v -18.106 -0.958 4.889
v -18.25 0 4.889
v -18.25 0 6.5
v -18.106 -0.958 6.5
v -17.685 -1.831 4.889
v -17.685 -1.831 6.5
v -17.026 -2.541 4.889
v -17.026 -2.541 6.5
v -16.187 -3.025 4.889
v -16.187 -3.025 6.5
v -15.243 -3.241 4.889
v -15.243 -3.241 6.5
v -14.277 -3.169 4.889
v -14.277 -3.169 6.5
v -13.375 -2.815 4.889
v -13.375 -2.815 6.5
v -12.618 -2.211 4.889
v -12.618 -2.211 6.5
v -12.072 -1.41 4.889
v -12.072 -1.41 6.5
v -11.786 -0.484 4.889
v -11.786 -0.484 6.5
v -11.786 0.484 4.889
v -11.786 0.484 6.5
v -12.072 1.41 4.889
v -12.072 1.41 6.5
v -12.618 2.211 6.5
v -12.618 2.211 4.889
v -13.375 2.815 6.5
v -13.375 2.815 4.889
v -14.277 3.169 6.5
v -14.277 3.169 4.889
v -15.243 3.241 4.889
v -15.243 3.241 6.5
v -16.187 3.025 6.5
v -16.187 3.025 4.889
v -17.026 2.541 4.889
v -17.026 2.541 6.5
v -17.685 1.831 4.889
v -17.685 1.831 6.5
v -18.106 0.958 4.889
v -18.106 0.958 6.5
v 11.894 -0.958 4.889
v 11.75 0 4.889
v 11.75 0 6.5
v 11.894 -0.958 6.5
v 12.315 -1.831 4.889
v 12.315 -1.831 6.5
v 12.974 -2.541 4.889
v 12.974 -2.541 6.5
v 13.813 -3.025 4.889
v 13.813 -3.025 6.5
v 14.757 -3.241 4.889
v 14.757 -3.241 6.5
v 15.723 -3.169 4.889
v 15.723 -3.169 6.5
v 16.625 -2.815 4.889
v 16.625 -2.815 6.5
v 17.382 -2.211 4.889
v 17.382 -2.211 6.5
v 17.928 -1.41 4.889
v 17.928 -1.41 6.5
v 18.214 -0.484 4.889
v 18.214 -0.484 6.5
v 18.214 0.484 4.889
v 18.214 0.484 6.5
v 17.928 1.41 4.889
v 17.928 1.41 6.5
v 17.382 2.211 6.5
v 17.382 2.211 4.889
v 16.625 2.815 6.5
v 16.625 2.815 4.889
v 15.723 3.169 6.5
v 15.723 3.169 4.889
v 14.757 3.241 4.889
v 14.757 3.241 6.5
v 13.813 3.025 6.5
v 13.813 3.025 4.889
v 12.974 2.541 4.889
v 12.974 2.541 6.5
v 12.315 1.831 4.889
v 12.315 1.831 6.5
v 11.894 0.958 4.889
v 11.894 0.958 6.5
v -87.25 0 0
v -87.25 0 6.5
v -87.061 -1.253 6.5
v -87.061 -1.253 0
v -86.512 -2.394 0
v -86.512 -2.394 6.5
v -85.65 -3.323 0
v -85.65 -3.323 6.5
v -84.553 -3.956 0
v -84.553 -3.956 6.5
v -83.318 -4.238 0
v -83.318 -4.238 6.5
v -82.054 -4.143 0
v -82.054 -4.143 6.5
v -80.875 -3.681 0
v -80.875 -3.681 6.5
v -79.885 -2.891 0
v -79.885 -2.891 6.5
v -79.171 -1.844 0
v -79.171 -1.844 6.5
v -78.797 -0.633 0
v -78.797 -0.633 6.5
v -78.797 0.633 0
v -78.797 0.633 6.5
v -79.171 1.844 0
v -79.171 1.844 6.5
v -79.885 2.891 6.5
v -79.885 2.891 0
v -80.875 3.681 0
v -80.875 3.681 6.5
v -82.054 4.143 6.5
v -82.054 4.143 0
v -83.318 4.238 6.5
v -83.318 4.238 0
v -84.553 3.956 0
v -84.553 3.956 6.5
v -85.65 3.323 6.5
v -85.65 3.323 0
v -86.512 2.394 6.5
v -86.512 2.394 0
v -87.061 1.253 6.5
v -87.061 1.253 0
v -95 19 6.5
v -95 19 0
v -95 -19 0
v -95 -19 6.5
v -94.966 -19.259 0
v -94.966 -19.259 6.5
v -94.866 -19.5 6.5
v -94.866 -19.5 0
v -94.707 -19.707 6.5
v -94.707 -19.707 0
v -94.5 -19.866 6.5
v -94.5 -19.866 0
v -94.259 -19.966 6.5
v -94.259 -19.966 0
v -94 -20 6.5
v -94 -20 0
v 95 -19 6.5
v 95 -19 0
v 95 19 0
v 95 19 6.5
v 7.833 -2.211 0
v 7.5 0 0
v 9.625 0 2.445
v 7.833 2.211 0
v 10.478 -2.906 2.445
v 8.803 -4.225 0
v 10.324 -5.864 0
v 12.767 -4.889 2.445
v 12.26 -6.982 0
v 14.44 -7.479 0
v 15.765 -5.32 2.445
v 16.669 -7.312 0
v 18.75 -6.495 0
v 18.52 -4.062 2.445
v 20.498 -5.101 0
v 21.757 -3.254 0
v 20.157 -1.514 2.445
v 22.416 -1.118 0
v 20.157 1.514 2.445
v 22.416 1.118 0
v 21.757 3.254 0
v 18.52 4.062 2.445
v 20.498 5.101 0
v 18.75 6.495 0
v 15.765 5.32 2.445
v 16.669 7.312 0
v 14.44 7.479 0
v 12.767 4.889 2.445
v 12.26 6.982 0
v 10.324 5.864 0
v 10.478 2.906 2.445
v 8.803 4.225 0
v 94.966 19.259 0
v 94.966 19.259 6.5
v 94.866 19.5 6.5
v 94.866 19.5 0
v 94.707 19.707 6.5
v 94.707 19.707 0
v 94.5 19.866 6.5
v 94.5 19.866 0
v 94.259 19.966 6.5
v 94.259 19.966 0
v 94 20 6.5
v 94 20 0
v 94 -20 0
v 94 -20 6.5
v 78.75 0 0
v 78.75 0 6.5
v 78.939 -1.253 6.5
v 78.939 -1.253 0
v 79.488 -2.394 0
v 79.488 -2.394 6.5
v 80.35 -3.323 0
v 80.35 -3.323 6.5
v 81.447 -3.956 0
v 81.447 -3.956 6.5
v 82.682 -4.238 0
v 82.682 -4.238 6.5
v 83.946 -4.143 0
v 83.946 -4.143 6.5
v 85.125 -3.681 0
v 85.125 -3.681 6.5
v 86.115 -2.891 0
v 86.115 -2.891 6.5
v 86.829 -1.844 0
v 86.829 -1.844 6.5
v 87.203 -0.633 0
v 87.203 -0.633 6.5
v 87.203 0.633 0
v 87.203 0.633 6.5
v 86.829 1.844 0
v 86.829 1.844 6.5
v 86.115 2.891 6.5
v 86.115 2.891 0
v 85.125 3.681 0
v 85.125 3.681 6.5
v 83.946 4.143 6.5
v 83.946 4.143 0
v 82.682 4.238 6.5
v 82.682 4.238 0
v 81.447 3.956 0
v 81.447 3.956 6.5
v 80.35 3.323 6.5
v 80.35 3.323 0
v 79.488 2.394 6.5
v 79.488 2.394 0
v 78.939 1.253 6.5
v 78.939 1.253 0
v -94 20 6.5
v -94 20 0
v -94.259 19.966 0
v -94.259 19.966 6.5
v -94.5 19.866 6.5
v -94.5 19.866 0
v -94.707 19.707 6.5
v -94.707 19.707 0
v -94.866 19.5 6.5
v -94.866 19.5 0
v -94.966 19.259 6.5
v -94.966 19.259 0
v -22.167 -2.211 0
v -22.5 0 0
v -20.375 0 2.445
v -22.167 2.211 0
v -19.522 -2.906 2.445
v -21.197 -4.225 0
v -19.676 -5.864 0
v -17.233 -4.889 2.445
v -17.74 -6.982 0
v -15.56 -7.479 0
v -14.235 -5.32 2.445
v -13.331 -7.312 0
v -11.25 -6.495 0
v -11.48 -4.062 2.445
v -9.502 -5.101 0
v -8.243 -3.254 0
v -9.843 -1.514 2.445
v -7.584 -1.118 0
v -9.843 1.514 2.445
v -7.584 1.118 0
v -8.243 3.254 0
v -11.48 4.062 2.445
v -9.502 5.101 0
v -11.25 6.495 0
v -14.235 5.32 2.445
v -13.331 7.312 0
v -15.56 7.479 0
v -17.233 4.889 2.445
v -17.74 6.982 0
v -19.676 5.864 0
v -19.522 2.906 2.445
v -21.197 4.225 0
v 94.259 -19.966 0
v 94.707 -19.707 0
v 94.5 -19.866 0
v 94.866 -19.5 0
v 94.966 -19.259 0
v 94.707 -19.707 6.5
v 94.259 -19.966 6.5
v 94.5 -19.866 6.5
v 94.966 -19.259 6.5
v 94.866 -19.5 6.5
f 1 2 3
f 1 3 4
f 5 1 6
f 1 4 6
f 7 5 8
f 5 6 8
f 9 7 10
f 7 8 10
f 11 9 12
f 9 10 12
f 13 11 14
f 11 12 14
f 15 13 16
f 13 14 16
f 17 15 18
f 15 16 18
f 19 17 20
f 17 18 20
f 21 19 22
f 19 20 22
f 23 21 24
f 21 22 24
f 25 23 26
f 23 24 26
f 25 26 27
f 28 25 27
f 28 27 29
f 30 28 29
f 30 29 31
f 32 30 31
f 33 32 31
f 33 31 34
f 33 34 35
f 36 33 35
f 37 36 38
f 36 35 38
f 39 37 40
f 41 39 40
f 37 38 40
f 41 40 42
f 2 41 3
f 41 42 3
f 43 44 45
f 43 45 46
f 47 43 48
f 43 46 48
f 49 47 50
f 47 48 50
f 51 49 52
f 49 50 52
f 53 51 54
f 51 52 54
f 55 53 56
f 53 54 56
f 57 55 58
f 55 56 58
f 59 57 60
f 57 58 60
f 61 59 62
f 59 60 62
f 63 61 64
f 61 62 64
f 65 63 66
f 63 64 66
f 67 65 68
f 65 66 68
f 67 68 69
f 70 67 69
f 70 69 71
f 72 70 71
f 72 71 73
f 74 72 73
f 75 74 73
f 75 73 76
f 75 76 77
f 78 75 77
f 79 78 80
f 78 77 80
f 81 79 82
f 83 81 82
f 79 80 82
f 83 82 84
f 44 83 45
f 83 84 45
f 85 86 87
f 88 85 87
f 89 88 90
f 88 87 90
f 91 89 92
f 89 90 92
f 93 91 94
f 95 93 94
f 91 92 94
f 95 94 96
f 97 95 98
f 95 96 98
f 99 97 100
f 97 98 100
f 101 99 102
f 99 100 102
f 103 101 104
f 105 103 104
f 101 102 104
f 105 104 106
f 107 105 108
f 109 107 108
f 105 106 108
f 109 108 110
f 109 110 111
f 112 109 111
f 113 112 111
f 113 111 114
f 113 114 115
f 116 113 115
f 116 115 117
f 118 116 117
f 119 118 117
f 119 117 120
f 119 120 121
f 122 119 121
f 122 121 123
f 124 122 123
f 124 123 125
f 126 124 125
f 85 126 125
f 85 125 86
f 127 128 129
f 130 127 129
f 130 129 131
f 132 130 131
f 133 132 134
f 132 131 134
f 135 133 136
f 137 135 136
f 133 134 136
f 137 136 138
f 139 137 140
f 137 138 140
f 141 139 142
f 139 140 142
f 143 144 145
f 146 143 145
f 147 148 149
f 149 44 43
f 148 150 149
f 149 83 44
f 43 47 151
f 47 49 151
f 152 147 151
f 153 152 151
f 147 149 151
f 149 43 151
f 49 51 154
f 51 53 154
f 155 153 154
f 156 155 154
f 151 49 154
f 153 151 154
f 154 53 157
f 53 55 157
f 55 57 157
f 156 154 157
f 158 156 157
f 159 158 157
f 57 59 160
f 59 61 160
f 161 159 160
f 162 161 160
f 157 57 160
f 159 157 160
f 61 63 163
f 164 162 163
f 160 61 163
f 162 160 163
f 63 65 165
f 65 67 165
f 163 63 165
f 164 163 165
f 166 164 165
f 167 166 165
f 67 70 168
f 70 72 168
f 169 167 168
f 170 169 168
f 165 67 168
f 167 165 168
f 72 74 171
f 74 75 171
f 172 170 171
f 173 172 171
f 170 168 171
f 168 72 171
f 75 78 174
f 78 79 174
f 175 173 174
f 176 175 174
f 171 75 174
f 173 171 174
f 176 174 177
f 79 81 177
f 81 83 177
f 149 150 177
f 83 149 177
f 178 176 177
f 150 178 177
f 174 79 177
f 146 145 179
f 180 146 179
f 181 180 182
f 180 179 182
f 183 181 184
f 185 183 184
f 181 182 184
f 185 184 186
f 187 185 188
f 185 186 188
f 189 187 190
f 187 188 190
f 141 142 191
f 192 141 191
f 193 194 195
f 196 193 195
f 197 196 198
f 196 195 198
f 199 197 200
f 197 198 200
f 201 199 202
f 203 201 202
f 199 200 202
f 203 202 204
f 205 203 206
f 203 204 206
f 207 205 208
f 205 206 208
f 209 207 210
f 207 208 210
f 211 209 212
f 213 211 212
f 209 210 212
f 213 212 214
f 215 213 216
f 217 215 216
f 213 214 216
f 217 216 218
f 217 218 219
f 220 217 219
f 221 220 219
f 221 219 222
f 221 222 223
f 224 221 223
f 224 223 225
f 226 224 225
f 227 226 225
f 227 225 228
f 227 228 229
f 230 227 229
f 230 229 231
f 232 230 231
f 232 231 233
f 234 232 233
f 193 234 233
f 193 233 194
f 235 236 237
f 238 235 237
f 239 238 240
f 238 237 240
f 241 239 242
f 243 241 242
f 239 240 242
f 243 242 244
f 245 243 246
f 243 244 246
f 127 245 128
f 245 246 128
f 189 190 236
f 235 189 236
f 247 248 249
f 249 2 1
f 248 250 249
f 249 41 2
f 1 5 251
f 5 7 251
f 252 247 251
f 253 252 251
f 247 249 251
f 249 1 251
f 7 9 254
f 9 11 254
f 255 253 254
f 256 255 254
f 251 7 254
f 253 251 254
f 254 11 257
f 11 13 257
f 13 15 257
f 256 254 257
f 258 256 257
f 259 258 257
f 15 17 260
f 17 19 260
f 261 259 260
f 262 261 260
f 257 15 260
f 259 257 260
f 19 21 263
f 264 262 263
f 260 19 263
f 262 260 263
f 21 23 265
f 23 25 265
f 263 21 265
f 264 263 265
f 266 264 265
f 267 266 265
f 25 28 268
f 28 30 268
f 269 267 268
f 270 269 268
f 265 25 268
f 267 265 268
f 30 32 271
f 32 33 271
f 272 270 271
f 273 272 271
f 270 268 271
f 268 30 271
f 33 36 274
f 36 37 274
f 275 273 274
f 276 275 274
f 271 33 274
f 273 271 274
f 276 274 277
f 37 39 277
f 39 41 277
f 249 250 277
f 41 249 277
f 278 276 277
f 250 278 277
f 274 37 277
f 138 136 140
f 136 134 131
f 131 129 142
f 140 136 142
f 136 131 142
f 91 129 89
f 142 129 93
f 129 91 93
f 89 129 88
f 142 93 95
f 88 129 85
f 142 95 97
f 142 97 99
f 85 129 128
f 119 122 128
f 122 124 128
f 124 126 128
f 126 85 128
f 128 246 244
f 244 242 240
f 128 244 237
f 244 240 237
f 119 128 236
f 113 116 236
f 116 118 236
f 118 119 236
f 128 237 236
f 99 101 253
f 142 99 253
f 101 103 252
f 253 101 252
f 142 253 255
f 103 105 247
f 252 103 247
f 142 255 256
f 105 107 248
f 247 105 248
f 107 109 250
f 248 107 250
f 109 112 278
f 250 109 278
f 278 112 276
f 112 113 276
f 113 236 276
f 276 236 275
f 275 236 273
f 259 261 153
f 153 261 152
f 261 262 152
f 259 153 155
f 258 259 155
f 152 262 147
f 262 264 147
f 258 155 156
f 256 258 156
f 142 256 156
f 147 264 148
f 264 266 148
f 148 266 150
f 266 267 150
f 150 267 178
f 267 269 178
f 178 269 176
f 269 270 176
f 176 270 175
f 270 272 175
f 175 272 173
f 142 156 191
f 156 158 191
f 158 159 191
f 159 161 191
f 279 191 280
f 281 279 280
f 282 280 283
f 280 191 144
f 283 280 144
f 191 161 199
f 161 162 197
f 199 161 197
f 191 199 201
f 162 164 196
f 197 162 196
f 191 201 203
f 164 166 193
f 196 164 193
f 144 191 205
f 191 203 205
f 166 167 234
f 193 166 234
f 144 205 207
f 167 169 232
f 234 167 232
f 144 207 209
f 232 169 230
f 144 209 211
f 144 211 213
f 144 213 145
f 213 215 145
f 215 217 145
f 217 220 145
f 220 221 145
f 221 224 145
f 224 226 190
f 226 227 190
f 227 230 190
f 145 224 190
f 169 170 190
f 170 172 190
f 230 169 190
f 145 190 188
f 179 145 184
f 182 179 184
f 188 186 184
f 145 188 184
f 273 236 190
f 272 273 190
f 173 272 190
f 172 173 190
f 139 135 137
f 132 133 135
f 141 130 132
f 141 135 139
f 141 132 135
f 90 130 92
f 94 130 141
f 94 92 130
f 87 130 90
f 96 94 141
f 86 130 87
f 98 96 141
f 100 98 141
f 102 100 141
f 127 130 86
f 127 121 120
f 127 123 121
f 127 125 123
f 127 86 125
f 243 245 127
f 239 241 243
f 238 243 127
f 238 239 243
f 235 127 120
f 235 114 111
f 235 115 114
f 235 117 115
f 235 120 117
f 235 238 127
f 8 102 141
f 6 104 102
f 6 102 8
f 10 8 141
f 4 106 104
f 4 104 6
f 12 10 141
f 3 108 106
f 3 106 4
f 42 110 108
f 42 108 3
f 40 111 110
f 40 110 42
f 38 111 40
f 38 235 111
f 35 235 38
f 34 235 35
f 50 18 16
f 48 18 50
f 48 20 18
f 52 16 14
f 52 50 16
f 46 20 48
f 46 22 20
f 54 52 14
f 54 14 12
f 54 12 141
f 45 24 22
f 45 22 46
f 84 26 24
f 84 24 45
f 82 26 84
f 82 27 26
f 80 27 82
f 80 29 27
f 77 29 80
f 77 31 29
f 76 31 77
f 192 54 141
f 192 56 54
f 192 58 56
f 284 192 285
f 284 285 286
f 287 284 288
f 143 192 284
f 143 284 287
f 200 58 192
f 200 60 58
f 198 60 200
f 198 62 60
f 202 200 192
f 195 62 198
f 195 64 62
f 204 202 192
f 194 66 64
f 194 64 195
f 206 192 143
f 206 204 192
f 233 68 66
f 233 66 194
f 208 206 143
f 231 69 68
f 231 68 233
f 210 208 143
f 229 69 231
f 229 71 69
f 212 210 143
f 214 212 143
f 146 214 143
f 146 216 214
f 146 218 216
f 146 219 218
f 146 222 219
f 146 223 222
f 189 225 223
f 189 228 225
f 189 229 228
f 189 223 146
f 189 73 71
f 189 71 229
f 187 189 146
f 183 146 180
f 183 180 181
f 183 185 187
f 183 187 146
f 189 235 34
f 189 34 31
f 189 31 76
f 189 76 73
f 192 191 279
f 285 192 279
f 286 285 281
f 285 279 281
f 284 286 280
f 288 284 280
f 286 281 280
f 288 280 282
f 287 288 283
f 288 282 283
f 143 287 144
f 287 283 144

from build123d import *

# Parameters (mm, degrees)
F1_DEPTH       = 6.5
F2_D           = 8.5
F3_D           = 8.5
F4_D           = 6.5
F4_CSINK_D     = 15
F4_CSINK_ANGLE = 82
F5_D           = 6.5
F5_CSINK_D     = 15
F5_CSINK_ANGLE = 82


with BuildPart() as f1:
    # F0 (on Top) → F1 (new body)
    with BuildSketch(Plane.XY):
        with BuildLine():
            Line((94, 20), (-94, 20))
            ThreePointArc((-94, 20), (-94.707107, 19.707107), (-95, 19))
            Line((-95, 19), (-95, -19))
            ThreePointArc((-95, -19), (-94.707107, -19.707107), (-94, -20))
            Line((-94, -20), (94, -20))
            ThreePointArc((94, -20), (94.707107, -19.707107), (95, -19))
            Line((95, -19), (95, 19))
            ThreePointArc((95, 19), (94.707107, 19.707107), (94, 20))
        make_face()
    extrude(amount=F1_DEPTH)

    # F2 (through all)
    with Locations(Plane(origin=(0, 0, 0), x_dir=(1, 0, 0), z_dir=(0, 0, -1))):
        with Locations((83, 0)):
            Hole(F2_D / 2)

    # F3 (through all)
    with Locations(Plane(origin=(0, 0, 0), x_dir=(1, 0, 0), z_dir=(0, 0, -1))):
        with Locations((-83, 0)):
            Hole(F3_D / 2)

    # F4 (through all)
    with Locations(Plane(origin=(0, 0, 0), x_dir=(1, 0, 0), z_dir=(0, 0, -1))):
        with Locations((15, 0)):
            CounterSinkHole(F4_D / 2, F4_CSINK_D / 2, counter_sink_angle=F4_CSINK_ANGLE)

    # F5 (through all)
    with Locations(Plane(origin=(0, 0, 0), x_dir=(1, 0, 0), z_dir=(0, 0, -1))):
        with Locations((-15, 0)):
            CounterSinkHole(F5_D / 2, F5_CSINK_D / 2, counter_sink_angle=F5_CSINK_ANGLE)


solid = f1.part
